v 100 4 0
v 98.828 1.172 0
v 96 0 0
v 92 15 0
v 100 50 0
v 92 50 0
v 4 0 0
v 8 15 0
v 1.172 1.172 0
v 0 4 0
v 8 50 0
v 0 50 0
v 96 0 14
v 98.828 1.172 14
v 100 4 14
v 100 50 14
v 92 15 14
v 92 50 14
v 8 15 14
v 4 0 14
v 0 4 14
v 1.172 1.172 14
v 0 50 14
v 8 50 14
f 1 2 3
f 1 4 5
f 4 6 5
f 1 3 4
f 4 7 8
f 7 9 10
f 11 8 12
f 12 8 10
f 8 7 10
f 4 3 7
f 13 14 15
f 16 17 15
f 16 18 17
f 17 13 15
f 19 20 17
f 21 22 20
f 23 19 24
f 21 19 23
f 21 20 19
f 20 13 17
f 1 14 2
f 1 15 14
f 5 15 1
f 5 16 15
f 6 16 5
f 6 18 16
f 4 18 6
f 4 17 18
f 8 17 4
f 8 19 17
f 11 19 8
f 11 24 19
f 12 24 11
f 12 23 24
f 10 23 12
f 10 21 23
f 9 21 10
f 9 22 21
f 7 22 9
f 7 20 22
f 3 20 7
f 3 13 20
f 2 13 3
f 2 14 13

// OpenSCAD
$fn = 32;

// ----------------------------------------------------------------------
// Heat sink frame: 100 x 50 mm frame, 8 mm walls
// ----------------------------------------------------------------------

// --- parameters (mm) ---
profile_height = 14;      // extrusion height
profile_points = 12;      // points of the closed outline

profile = [[0, 4], [1.172, 1.172], [4, 0], [96, 0], [98.828, 1.172], [100, 4], [100, 50], [92, 50], [92, 15], [8, 15], [8, 50], [0, 50]];  // single closed polygon, 12 points, counter clockwise

// --- the one profile operation ---
linear_extrude(height = profile_height) polygon(points = profile);
